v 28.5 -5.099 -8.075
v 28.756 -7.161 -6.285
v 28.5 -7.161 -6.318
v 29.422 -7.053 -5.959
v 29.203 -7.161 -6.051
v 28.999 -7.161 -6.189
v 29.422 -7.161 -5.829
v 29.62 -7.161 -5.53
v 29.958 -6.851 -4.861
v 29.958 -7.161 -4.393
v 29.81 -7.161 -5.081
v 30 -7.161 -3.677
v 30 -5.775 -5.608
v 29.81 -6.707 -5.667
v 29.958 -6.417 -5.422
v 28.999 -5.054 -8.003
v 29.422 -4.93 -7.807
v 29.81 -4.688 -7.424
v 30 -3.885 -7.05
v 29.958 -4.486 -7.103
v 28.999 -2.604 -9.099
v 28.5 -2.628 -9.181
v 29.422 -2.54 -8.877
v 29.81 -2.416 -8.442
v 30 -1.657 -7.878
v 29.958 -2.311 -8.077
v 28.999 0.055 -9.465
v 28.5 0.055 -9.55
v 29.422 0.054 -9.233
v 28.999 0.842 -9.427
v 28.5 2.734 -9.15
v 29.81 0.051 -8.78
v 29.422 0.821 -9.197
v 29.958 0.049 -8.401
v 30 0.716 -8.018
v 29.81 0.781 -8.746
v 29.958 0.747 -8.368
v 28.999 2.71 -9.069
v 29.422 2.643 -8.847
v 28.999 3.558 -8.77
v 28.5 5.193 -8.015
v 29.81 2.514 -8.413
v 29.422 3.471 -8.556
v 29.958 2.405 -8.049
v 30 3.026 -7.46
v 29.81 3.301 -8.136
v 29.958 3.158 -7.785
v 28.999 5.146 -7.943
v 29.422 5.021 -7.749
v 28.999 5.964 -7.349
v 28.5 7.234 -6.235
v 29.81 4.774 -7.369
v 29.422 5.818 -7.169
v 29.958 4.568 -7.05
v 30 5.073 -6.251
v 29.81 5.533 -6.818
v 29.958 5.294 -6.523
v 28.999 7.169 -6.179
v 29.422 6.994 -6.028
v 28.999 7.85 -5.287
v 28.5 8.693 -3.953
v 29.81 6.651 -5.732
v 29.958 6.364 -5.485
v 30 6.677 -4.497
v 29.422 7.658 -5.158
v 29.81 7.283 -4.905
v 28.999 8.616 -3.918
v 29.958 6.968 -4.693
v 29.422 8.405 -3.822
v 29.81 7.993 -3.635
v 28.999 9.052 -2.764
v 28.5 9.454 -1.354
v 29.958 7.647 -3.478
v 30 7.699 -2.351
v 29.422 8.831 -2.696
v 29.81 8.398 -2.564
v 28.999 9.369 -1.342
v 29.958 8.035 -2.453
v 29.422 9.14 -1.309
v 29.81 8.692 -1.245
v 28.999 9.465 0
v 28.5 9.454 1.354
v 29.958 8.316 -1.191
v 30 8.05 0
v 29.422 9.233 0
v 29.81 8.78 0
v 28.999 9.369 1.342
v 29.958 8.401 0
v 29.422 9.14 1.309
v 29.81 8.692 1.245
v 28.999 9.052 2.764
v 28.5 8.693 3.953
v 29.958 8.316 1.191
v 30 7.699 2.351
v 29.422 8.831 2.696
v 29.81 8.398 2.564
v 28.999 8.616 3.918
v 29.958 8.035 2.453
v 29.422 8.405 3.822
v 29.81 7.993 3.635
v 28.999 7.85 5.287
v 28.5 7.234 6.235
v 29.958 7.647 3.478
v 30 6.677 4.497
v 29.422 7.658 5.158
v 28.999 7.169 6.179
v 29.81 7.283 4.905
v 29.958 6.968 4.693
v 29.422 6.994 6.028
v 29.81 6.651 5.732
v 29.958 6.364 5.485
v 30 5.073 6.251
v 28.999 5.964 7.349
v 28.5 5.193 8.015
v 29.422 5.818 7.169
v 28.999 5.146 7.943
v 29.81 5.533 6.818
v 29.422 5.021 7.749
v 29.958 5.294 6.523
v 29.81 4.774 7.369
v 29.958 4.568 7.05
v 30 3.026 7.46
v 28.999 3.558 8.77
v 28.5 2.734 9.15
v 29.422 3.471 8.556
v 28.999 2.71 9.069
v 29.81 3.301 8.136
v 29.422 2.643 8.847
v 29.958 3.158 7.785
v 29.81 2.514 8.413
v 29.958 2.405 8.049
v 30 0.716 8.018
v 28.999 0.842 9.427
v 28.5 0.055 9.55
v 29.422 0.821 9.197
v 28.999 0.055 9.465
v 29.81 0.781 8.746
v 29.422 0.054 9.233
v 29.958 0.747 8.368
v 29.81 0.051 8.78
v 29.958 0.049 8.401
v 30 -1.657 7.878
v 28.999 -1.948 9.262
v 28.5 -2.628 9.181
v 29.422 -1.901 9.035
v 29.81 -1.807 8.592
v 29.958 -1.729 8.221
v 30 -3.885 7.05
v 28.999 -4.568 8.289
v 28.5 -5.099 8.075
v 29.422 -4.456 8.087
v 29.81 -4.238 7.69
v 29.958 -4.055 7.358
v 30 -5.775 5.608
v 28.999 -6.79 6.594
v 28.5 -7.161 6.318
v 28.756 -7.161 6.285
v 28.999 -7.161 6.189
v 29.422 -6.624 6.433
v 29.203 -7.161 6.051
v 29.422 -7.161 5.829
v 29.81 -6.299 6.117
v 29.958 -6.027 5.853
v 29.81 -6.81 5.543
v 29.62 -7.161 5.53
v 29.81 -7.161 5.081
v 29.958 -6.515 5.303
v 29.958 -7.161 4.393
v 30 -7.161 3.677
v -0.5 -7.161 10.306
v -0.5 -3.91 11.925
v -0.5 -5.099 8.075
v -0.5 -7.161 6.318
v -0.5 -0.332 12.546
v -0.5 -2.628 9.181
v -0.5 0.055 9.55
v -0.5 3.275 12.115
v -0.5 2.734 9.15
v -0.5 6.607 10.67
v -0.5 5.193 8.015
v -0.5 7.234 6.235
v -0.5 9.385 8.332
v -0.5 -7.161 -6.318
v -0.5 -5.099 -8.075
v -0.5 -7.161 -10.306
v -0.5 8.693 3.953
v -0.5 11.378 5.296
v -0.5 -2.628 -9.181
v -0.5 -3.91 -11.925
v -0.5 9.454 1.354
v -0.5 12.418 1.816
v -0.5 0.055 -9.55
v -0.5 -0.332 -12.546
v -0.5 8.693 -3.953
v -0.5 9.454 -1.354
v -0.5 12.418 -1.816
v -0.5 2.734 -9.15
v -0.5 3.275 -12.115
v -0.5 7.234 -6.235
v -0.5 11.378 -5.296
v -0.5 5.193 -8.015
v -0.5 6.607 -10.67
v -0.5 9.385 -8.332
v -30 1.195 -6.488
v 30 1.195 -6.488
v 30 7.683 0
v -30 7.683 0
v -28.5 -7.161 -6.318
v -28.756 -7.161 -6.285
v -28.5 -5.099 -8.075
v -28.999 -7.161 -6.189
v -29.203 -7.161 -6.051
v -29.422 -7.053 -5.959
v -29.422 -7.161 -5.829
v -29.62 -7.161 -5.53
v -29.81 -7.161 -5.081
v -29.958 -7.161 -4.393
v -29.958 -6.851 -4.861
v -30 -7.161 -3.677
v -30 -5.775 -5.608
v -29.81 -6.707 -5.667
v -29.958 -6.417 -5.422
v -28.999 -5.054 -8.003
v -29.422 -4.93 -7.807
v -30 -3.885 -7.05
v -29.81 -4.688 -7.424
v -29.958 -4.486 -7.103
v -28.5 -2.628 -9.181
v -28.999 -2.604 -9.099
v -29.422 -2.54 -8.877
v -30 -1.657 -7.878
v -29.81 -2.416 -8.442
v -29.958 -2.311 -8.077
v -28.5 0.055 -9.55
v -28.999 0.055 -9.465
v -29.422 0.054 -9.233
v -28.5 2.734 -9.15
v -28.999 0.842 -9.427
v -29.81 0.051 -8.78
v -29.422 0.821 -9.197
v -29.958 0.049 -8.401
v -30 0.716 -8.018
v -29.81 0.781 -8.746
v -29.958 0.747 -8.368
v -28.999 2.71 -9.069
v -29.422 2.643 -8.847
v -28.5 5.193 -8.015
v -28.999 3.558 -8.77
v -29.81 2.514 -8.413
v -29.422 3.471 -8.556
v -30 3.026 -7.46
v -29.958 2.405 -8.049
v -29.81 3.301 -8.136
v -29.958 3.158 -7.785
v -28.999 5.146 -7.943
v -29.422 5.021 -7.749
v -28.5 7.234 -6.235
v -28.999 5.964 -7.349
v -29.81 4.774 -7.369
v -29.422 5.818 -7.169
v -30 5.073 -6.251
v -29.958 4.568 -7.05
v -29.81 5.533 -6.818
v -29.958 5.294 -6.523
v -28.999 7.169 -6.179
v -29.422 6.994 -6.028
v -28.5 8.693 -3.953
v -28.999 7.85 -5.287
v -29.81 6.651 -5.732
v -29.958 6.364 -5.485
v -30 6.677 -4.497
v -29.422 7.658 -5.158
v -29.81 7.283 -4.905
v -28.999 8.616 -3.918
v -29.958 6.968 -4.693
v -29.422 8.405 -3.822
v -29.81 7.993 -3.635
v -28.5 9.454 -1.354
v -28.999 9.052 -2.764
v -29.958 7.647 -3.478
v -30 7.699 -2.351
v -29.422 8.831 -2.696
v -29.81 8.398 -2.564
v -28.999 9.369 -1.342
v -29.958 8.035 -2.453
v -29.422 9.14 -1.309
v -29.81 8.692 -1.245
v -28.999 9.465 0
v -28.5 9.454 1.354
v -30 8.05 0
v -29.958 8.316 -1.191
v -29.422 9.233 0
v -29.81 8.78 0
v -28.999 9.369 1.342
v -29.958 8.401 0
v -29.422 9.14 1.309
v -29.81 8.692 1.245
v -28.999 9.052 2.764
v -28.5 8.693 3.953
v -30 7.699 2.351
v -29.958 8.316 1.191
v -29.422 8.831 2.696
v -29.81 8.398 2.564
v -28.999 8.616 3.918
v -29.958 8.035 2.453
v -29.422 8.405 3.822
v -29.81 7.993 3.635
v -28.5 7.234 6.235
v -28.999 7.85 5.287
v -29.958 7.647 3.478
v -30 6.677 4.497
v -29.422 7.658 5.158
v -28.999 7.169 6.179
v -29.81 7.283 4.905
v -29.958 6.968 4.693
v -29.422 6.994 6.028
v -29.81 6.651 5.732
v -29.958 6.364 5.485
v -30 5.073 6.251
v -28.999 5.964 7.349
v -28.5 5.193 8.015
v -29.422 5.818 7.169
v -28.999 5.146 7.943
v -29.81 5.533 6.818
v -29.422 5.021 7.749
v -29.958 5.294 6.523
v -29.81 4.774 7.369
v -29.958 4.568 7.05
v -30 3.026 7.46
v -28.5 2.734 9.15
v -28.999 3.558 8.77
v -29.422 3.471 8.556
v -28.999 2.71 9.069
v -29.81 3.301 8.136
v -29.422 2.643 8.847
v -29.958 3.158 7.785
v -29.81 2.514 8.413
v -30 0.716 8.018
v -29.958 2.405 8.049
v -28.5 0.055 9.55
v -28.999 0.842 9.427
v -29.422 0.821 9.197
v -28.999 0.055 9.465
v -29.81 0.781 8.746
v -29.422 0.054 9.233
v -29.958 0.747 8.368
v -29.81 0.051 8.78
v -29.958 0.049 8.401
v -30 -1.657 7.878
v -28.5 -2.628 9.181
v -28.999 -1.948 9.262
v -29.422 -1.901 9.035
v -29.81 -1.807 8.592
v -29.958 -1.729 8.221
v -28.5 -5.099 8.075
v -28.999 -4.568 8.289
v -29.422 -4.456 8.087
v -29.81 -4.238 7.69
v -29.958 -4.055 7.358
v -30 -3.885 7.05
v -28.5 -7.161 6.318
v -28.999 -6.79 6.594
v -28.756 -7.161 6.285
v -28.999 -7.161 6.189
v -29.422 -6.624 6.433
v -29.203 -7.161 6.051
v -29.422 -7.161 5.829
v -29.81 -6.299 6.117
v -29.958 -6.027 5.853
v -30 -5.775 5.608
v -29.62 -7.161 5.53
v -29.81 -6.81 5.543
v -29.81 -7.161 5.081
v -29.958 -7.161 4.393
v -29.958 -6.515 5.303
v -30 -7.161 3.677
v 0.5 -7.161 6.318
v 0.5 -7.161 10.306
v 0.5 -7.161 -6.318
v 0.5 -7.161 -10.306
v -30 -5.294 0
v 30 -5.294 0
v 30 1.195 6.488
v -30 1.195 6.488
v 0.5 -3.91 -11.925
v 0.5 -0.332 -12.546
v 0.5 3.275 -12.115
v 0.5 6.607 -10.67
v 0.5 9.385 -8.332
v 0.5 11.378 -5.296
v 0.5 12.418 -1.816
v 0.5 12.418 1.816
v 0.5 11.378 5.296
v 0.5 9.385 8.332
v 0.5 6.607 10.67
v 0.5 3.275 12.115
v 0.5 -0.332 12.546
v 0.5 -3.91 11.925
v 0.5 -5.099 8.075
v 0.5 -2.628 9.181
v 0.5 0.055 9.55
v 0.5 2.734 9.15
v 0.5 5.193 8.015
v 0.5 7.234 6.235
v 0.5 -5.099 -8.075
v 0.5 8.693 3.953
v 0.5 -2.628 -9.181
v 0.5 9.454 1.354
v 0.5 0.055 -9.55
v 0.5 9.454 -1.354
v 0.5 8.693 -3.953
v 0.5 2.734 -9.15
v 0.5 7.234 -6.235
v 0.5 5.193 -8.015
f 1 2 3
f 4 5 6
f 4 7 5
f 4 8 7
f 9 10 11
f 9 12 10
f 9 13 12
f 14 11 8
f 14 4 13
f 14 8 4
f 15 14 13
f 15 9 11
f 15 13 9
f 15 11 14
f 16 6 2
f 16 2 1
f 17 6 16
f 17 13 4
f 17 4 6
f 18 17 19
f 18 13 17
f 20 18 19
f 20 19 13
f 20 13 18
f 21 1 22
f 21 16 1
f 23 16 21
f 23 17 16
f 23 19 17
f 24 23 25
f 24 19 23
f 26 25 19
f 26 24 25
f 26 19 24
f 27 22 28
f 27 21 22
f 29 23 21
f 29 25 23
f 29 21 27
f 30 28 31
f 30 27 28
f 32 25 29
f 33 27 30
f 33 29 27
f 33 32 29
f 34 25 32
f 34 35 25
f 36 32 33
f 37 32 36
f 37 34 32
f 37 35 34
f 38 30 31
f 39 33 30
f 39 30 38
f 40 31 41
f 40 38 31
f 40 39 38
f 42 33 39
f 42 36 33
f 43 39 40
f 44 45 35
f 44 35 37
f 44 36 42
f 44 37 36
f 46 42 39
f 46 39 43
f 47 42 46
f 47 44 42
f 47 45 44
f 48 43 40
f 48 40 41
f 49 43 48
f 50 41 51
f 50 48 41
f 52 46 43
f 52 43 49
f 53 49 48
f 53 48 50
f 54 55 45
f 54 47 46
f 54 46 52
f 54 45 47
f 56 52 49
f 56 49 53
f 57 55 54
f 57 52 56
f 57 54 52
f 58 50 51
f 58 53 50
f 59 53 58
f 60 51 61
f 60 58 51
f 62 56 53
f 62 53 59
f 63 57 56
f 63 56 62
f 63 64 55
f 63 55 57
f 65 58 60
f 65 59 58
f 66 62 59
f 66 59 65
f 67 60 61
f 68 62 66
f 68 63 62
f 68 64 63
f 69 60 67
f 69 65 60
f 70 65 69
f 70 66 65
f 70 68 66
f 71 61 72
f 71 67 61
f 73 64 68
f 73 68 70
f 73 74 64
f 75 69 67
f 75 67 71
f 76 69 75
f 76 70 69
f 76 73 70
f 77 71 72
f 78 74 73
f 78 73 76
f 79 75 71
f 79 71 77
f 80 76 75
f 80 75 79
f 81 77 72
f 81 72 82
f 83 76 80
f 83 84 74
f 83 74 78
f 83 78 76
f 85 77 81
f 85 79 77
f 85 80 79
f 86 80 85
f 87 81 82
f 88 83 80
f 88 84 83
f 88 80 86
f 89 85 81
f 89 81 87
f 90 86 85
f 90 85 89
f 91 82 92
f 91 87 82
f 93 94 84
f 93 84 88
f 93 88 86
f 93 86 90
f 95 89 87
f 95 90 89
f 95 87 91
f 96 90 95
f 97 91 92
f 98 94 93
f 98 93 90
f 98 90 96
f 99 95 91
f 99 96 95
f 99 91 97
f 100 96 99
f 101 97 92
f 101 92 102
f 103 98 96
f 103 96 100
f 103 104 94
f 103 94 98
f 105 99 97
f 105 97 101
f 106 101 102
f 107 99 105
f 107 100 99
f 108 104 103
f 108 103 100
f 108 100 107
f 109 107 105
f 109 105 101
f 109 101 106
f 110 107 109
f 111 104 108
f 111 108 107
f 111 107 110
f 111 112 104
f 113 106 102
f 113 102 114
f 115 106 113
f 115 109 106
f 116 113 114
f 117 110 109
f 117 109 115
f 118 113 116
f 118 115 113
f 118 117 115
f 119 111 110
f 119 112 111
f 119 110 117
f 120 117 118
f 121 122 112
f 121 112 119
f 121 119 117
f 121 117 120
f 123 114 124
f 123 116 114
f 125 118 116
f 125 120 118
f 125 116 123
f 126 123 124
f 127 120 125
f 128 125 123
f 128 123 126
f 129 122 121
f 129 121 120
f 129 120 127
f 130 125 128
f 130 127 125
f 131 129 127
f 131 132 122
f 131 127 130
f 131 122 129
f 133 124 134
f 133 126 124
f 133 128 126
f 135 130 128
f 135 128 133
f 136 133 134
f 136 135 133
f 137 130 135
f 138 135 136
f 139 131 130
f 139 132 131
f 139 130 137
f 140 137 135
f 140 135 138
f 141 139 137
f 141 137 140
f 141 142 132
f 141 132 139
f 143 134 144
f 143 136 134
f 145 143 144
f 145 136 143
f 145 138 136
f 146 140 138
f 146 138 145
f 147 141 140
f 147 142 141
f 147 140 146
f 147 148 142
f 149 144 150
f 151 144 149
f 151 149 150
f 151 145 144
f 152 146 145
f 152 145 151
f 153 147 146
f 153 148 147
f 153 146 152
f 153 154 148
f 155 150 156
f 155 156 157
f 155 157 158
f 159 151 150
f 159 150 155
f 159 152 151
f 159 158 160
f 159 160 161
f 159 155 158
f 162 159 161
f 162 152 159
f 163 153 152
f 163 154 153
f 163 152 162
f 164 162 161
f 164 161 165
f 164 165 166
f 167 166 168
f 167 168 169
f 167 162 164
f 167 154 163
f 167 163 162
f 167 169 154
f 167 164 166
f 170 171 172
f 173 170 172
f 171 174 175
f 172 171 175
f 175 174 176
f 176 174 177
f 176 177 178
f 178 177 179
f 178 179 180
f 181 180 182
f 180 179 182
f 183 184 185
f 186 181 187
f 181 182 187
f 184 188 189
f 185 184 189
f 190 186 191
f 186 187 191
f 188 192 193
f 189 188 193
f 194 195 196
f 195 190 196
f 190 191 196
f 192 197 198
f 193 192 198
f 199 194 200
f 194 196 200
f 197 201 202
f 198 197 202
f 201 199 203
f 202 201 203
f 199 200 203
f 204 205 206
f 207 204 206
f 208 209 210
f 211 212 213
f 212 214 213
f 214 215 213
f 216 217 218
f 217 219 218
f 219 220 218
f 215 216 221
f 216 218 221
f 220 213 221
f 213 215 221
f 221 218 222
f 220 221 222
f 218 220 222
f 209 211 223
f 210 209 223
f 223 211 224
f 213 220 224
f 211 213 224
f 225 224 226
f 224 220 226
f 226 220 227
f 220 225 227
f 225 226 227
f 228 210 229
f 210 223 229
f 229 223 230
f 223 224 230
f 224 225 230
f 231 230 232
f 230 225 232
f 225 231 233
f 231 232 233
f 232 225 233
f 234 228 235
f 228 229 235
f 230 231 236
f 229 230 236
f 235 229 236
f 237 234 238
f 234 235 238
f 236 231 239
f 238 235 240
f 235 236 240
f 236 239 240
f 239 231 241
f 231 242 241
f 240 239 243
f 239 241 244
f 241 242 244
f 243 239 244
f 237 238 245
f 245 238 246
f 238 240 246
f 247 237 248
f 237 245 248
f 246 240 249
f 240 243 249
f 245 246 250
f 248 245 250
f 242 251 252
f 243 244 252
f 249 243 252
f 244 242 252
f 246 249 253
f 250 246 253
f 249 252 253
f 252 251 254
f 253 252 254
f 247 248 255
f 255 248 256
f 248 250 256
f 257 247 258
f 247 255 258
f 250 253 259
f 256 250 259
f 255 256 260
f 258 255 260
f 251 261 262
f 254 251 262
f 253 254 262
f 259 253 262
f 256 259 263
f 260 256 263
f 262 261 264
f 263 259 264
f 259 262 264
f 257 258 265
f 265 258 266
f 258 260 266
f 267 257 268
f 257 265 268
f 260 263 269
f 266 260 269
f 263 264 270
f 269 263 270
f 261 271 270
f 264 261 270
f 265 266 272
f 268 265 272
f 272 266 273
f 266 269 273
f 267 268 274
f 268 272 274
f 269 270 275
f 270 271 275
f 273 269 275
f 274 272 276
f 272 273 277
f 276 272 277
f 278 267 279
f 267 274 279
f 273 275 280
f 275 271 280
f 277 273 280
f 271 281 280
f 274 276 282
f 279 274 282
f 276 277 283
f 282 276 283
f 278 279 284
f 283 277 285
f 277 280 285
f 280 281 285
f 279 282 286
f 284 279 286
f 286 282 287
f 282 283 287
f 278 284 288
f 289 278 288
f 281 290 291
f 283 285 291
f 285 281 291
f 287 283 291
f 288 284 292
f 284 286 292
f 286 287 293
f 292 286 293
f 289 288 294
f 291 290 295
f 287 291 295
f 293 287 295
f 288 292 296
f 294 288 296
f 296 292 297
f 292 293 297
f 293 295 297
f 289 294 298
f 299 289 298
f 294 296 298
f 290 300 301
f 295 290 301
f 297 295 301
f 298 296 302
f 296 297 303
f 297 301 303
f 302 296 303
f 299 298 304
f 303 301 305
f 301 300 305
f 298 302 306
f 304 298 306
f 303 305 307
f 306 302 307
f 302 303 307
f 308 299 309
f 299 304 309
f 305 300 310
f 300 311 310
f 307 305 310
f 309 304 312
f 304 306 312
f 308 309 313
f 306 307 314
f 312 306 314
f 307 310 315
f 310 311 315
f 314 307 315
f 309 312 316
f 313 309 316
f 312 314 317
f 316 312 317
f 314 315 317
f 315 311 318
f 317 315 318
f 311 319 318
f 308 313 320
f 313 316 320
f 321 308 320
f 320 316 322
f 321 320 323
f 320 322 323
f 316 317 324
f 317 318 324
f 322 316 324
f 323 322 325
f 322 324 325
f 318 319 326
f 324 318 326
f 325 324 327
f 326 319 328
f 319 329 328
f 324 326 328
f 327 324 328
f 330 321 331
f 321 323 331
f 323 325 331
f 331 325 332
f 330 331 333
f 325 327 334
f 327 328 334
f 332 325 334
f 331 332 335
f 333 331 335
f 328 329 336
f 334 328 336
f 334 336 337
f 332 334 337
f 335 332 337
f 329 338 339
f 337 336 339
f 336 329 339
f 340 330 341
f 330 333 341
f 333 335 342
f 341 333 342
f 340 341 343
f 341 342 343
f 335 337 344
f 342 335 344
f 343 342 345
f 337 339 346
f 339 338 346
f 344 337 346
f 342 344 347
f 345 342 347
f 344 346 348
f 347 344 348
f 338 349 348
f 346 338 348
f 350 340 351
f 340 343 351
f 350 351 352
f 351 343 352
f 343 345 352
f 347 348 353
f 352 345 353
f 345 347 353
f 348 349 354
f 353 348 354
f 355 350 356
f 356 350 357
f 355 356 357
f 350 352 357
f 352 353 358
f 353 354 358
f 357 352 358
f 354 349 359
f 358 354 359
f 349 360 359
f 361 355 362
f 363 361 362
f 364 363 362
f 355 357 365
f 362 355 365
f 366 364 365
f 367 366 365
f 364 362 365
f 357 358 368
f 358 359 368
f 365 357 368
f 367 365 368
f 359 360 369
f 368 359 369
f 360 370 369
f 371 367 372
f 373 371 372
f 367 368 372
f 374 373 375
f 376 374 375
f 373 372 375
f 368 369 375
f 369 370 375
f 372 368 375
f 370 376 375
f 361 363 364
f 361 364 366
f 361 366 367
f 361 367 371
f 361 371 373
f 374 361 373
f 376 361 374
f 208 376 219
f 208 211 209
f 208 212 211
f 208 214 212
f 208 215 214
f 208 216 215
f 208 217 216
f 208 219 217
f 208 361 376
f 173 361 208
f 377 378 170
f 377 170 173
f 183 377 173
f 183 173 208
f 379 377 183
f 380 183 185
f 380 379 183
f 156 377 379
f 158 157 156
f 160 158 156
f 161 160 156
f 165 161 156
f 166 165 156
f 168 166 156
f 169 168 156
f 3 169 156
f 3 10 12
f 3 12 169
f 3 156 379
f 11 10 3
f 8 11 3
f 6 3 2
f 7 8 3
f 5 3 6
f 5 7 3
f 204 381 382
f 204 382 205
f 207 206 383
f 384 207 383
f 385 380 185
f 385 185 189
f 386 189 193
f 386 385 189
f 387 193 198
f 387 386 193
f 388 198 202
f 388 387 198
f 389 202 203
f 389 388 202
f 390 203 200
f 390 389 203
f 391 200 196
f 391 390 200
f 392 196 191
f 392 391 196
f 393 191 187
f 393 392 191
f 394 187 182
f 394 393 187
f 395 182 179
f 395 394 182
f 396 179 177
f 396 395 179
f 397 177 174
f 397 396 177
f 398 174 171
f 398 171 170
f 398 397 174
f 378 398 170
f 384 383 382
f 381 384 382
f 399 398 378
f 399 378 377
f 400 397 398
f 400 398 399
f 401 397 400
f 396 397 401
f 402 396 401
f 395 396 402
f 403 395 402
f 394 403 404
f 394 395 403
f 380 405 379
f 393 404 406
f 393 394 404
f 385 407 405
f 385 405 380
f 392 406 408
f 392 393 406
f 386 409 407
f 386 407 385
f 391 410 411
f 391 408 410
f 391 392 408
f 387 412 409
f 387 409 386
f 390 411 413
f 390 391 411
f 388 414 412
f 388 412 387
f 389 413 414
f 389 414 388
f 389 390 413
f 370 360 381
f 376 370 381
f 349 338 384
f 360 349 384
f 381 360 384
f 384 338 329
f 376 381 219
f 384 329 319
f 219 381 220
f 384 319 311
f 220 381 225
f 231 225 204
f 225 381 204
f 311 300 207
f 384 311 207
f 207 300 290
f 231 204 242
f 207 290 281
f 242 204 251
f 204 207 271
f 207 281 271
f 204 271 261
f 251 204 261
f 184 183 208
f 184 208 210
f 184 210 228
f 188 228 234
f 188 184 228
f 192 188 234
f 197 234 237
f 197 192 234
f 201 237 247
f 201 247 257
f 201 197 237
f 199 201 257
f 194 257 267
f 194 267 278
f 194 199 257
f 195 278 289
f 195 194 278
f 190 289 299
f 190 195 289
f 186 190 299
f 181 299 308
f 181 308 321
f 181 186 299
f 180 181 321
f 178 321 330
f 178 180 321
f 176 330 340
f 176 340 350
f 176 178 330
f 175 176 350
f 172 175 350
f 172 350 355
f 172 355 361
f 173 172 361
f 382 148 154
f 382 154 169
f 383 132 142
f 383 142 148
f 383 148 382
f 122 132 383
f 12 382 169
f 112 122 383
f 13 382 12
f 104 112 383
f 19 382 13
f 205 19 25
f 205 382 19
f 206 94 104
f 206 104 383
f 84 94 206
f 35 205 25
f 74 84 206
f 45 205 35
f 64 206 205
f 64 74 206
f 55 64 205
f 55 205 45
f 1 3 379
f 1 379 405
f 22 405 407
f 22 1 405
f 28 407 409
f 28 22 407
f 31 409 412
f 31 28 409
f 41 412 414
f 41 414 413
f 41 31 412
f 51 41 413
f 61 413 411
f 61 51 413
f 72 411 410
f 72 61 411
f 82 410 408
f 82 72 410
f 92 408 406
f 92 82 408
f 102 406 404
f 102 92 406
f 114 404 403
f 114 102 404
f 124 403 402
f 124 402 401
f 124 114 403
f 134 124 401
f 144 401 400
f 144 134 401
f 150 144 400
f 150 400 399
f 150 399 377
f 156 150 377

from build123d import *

# Parameters (mm, degrees)
BOSS_EXTRU_1_DEPTH      = 30
BOSS_EXTRU_2_DEPTH      = 0.5
ENL_V_MAT_EXTRU_1_DEPTH = 50
CONG_1_R                = 1.5


with BuildPart() as part:
    # Esquisse1 → Boss.-Extru.1 (new body, symmetric)
    with BuildSketch(Plane(origin=(0, 0, 0), x_dir=(0, 0, -1), z_dir=(1, 0, 0))):
        with BuildLine():
            Line((-6.318486634, -7.160951519), (6.318486634, -7.160951519))
            ThreePointArc((6.318486634, -7.160951519), (0, 9.55), (-6.318486634, -7.160951519))
        make_face()
    extrude(amount=BOSS_EXTRU_1_DEPTH, both=True)

    # Esquisse3 → Boss.-Extru.2 (add, symmetric)
    with BuildSketch(Plane(origin=(0, 0, 0), x_dir=(0, 0, -1), z_dir=(1, 0, 0))):
        with BuildLine():
            Line((-10.306467549, -7.160951519), (10.306467549, -7.160951519))
            ThreePointArc((10.306467549, -7.160951519), (0, 12.55), (-10.306467549, -7.160951519))
        make_face()
    extrude(amount=BOSS_EXTRU_2_DEPTH, both=True)

    # Esquisse2 → Enlèv. mat.-Extru.1 (cut, symmetric)
    with BuildSketch(Plane(origin=(0, 0, 0), x_dir=(0, 0, -1), z_dir=(1, 0, 0))):
        Polygon((-6.488442747, 1.194524241), (0, -5.293918507), (6.488442747, 1.194524241), (0, 7.682966988), align=None)
    extrude(amount=ENL_V_MAT_EXTRU_1_DEPTH, both=True, mode=Mode.SUBTRACT)

    # Congé1
    cong_1_edges = [part.edges().sort_by_distance(p)[0] for p in [
        (-30, 9.55, 0),
        (30, 9.55, 0),
    ]]
    fillet(cong_1_edges, radius=CONG_1_R)


solid = part.part
